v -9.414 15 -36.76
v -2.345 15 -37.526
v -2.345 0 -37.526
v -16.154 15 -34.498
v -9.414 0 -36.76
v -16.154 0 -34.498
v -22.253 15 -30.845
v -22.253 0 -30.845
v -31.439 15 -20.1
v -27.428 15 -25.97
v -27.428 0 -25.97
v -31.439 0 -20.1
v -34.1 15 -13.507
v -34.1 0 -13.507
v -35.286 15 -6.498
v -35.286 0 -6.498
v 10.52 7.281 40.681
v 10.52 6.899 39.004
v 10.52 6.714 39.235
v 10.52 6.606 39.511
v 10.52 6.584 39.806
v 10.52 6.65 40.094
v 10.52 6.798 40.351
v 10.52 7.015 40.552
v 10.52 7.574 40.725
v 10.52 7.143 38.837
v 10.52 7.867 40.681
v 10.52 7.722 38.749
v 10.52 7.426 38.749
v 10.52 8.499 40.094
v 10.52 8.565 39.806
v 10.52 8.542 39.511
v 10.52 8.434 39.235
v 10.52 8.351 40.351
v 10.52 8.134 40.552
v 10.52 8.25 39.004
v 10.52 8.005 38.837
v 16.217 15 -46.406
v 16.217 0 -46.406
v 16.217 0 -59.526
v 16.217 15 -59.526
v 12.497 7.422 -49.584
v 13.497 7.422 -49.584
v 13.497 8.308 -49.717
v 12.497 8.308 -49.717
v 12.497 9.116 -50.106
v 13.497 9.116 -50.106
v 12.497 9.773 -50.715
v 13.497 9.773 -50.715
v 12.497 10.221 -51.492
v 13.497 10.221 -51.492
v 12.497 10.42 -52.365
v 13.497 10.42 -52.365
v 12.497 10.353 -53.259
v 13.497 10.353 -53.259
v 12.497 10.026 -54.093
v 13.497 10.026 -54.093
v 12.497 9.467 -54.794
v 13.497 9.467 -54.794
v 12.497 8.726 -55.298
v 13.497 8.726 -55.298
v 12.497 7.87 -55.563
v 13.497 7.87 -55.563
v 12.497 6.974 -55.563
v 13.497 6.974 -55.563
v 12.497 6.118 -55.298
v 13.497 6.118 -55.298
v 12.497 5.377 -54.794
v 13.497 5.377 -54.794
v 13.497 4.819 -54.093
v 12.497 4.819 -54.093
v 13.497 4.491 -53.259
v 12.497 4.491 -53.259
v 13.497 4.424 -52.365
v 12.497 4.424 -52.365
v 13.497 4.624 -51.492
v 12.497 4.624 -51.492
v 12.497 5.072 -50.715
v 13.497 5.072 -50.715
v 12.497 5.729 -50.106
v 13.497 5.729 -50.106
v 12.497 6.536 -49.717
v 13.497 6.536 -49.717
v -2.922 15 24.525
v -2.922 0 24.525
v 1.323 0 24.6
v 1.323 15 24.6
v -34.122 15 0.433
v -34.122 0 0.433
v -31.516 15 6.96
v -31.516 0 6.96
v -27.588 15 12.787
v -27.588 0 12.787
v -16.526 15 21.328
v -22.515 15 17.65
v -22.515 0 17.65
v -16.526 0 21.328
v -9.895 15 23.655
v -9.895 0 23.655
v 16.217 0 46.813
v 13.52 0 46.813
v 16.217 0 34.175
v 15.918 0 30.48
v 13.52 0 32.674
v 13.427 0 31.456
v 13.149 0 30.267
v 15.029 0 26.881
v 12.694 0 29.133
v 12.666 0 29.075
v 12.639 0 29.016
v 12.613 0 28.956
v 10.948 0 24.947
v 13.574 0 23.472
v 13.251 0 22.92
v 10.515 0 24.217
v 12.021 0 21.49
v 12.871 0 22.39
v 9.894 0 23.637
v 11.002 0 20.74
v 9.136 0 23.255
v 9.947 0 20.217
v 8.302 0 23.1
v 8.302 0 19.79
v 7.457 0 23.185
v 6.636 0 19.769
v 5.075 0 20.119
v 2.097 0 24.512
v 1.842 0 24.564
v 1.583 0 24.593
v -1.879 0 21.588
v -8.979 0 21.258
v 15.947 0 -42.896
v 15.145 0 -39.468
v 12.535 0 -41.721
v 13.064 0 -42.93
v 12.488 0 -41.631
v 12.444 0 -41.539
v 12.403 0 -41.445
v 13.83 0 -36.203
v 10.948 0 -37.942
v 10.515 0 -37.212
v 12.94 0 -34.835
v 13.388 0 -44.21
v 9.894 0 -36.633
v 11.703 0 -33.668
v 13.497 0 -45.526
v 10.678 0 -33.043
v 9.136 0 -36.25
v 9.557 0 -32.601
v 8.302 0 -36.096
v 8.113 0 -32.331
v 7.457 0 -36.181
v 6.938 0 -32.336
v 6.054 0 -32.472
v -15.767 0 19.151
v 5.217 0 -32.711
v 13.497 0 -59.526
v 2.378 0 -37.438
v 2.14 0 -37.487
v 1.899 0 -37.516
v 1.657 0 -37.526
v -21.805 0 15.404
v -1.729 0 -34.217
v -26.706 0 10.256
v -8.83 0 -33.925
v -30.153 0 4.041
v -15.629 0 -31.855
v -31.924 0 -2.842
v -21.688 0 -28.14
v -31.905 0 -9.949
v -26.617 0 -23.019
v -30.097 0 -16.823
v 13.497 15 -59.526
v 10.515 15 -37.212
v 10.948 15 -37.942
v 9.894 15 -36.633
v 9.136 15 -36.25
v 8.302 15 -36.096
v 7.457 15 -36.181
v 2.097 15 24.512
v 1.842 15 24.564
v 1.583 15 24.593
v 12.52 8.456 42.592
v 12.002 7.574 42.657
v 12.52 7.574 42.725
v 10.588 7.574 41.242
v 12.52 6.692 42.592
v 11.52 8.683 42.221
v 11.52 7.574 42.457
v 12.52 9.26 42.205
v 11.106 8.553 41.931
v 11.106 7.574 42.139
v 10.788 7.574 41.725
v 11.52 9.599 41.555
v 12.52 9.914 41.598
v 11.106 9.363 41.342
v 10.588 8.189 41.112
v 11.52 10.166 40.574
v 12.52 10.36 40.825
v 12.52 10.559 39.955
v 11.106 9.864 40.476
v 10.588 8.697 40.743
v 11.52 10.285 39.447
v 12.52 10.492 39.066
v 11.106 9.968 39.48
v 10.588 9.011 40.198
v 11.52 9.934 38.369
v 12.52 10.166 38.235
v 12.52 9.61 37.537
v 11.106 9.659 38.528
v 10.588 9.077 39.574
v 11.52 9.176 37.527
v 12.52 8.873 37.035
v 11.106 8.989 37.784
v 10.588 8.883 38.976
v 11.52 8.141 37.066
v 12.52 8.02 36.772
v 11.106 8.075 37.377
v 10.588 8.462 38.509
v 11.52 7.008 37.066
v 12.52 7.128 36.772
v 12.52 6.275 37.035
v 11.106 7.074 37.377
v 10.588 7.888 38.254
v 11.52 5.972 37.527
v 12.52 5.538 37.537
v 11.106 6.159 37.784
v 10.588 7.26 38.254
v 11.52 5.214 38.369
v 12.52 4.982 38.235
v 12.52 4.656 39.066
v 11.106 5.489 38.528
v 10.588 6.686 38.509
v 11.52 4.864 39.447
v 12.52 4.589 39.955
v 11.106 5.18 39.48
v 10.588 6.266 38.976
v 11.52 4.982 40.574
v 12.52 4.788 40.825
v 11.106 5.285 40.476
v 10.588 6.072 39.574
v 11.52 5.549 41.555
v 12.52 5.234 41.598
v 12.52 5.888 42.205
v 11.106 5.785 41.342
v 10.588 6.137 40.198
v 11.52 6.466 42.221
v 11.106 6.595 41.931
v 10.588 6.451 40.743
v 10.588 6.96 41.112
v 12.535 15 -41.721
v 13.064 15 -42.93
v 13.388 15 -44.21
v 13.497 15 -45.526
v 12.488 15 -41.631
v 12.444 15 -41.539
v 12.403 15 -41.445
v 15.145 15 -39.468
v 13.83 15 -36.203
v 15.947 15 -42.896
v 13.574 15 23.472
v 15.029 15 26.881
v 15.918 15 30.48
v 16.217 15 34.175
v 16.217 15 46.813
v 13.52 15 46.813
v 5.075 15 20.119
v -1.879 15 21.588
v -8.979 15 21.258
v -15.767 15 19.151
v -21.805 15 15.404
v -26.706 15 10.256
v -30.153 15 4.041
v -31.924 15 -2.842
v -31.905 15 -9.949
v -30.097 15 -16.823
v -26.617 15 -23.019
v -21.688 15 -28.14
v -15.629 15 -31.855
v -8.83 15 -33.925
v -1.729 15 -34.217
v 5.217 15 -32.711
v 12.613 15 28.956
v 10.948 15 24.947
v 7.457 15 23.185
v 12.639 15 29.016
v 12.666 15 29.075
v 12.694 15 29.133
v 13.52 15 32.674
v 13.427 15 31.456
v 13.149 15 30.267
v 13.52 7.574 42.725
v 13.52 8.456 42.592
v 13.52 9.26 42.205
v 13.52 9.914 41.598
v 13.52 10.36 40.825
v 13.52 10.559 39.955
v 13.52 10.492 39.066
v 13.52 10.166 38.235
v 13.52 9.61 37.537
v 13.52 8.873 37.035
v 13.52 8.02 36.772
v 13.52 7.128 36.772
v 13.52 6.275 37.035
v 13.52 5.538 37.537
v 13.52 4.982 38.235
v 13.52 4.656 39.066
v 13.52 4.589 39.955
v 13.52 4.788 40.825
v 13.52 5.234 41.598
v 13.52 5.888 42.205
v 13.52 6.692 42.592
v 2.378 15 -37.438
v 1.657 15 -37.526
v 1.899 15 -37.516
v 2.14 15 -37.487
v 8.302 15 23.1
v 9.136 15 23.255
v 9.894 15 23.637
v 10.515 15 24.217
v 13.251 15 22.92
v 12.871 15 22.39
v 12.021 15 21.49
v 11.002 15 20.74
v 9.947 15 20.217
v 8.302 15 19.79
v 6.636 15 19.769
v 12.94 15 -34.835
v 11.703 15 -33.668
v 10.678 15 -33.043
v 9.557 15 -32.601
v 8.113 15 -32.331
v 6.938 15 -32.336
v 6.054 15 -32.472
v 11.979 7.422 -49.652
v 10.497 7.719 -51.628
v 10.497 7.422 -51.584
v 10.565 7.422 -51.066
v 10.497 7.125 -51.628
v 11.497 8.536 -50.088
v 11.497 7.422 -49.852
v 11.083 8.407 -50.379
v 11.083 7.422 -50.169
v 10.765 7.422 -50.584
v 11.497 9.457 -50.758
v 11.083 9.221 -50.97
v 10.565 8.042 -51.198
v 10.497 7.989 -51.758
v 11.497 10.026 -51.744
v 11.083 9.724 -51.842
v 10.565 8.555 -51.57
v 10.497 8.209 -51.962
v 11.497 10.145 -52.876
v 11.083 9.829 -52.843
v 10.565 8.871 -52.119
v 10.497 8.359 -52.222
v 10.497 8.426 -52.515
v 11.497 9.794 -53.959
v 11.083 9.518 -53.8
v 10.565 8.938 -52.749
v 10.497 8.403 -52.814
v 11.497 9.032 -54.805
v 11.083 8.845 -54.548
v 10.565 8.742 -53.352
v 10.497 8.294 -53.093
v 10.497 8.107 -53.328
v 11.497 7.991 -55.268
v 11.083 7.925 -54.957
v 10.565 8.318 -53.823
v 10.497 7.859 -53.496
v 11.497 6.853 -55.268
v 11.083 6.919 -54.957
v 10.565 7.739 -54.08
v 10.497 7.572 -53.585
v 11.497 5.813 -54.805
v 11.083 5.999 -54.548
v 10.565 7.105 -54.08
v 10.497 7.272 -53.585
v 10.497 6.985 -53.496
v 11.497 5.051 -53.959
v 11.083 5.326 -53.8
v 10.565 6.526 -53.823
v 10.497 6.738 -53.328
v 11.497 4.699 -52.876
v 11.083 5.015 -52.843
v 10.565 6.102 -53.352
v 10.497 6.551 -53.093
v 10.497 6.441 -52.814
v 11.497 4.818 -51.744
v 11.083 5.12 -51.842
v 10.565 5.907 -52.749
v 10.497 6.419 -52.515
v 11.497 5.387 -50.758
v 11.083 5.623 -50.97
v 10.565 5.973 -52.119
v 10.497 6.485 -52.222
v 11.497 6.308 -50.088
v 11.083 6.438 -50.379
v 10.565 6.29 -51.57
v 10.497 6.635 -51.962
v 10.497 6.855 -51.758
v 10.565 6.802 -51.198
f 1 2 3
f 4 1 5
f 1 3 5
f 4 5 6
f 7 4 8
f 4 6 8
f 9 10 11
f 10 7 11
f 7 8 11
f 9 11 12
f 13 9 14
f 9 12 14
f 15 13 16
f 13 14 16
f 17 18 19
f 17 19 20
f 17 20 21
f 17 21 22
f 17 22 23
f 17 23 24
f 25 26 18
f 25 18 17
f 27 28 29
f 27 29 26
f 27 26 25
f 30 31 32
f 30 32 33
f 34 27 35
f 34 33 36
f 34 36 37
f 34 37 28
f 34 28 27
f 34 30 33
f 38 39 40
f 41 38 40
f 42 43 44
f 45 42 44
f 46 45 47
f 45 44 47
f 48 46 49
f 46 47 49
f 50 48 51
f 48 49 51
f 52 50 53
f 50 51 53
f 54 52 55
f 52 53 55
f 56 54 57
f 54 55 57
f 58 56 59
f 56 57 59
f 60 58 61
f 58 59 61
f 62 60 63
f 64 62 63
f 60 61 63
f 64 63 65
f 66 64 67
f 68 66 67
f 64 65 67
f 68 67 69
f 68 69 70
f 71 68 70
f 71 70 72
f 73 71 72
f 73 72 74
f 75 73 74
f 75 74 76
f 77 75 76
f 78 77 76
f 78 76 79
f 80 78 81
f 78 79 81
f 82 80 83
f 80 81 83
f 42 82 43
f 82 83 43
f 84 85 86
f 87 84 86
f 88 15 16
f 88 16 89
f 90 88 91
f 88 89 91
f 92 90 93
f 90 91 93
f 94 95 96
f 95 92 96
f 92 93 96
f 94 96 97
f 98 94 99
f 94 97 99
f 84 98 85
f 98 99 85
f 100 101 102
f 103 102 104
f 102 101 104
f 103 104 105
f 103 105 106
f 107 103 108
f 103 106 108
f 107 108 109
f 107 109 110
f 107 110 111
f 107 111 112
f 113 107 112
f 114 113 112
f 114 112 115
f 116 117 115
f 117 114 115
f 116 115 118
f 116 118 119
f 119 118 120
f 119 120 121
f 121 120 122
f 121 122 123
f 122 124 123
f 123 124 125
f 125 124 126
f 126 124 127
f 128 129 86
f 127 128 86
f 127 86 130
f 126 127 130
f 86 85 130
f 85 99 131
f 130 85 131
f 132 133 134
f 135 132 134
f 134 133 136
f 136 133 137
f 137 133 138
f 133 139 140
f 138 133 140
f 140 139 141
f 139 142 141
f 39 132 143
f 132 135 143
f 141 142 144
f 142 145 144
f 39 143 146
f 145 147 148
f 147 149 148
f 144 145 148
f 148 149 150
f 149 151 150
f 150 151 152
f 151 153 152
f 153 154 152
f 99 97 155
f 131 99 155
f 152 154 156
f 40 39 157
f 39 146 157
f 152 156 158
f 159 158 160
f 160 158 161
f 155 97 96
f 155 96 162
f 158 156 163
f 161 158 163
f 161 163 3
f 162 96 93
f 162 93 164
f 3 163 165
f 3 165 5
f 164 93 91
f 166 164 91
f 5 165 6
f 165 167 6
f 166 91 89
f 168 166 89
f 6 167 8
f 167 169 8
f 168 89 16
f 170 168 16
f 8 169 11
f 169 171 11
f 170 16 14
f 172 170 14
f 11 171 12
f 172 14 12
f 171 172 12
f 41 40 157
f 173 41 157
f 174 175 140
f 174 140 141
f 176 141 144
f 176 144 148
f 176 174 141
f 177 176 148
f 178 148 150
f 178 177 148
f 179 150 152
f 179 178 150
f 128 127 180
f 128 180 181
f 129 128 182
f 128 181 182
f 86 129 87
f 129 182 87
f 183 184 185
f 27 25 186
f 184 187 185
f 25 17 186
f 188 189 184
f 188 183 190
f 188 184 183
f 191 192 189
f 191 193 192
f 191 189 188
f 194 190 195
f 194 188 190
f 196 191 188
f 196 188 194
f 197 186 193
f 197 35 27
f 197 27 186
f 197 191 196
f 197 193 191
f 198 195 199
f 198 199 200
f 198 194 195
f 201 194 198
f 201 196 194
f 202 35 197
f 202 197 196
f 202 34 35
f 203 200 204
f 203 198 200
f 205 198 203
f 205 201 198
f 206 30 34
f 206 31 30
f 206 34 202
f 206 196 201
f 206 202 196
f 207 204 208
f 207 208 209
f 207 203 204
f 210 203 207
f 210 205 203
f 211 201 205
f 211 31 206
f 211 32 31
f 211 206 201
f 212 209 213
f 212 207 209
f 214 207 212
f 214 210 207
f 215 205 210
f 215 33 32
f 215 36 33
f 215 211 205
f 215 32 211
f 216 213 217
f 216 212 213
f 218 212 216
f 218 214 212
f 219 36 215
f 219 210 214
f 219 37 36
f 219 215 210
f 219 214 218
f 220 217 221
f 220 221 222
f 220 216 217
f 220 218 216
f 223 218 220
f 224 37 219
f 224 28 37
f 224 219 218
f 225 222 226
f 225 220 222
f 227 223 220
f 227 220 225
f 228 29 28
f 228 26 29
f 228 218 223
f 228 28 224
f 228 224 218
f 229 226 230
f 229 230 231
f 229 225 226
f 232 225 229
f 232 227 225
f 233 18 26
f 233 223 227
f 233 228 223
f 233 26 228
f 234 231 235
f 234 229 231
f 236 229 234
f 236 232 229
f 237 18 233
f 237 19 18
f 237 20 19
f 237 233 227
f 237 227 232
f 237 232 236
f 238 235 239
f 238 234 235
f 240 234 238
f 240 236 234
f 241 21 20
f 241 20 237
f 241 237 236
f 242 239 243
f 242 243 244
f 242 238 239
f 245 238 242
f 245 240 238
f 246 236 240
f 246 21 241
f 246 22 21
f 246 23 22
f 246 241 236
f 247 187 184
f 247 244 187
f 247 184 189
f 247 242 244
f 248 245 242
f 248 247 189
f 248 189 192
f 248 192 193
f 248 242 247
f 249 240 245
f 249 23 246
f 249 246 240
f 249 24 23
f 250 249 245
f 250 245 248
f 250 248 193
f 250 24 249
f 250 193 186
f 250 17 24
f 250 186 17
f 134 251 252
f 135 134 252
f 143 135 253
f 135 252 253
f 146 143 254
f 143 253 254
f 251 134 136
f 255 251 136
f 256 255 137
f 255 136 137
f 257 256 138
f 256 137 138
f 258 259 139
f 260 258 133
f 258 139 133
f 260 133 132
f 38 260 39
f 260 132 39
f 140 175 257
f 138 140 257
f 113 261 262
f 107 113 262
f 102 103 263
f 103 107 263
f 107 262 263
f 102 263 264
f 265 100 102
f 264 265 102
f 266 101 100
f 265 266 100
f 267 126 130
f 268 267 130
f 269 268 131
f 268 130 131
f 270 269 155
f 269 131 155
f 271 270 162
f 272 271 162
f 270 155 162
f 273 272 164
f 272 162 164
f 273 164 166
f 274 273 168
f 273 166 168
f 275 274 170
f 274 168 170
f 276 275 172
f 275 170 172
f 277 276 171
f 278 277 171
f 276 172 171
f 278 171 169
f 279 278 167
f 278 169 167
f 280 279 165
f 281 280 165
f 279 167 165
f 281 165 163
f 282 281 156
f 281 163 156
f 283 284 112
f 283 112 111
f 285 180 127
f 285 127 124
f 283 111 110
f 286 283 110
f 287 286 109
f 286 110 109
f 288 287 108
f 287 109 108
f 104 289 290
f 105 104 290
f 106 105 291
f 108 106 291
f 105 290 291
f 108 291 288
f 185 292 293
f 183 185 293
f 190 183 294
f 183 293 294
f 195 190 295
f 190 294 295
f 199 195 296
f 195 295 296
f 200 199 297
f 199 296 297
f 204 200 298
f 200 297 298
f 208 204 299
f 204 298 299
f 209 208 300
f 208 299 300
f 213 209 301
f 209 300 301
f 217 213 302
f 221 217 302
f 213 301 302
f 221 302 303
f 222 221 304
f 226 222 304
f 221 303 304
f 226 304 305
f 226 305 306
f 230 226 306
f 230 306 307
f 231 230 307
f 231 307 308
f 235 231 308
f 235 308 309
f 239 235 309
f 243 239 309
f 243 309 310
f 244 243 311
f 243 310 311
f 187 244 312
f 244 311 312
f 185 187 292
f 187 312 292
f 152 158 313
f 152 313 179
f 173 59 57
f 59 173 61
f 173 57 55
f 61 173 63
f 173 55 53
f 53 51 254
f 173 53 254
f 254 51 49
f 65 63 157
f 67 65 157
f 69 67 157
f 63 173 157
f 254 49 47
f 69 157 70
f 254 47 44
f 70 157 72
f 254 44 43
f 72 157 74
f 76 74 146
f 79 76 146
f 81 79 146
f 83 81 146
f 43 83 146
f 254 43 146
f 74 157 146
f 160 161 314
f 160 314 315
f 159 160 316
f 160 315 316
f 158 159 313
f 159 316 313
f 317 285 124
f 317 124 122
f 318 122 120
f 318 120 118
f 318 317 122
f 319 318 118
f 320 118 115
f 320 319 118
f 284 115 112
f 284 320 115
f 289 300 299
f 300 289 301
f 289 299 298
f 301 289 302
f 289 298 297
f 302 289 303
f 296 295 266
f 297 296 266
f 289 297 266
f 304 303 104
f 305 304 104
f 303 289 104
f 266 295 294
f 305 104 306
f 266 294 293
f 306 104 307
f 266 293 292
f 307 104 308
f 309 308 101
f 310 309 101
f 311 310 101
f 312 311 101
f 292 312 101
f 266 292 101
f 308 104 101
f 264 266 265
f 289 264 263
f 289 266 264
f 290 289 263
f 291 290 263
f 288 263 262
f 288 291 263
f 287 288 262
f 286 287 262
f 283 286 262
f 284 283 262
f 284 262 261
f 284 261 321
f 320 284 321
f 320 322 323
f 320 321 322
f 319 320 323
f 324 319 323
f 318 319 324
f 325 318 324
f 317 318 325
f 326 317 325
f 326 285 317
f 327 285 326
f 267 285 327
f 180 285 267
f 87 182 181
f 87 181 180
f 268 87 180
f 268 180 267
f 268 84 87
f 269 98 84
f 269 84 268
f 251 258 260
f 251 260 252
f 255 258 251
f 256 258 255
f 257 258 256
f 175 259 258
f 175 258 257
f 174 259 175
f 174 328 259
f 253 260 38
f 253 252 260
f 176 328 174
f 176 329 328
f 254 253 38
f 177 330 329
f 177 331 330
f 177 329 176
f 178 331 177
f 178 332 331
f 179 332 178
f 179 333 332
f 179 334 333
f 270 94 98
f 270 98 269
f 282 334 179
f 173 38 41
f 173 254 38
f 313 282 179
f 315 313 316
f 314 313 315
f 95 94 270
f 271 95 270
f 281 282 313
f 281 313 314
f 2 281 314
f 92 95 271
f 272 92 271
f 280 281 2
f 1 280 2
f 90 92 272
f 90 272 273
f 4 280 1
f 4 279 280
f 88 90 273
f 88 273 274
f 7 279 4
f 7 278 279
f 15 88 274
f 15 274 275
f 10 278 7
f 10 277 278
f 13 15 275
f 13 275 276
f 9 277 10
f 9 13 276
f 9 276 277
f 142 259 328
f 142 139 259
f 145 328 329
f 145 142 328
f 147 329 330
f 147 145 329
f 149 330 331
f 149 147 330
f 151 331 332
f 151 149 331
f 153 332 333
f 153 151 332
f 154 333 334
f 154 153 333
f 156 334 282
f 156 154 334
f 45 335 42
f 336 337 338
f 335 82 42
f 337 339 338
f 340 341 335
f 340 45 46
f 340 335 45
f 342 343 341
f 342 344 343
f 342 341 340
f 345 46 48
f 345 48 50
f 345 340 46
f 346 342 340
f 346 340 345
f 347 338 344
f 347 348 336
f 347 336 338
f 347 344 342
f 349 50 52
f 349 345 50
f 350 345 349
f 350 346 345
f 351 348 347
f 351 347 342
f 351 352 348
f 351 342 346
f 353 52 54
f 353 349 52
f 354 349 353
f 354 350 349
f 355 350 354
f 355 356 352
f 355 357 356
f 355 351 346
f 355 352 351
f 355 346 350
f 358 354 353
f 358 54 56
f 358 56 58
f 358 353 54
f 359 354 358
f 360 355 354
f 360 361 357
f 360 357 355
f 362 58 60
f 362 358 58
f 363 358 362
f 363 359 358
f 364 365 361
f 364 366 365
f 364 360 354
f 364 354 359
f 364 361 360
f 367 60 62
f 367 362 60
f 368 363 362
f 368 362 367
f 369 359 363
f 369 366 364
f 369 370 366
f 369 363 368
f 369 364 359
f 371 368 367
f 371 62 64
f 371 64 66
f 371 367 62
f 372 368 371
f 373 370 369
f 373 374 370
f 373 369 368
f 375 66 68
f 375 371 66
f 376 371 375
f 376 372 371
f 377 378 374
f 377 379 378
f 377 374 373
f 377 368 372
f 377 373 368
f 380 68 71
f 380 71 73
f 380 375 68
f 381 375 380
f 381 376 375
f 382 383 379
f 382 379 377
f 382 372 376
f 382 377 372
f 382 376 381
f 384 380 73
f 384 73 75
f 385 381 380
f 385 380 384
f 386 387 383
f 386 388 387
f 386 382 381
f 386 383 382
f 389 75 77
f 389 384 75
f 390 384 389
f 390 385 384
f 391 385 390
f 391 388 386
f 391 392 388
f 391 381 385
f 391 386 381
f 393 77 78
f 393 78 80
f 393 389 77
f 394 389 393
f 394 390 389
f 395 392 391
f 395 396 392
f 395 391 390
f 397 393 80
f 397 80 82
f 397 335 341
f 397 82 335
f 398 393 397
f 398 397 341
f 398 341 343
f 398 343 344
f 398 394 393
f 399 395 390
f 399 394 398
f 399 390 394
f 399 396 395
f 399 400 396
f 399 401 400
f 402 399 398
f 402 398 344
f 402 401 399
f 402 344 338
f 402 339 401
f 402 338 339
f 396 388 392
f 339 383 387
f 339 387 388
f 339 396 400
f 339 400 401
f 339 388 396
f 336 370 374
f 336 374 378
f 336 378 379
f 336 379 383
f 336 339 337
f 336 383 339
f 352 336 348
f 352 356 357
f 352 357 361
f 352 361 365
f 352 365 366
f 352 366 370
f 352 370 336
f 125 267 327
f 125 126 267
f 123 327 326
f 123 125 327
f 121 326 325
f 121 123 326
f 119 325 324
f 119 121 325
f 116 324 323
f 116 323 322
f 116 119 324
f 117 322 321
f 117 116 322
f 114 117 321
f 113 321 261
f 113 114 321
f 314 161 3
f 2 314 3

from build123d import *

# Parameters (mm, degrees)
BOSS_EXTRUDE1_DEPTH = 15
FILLET1_R           = 33
FILLET3_R           = 8
SKETCH3_W           = 14.976754218
SKETCH3_H           = 50.502927364
CUT_EXTRUDE1_DEPTH  = 71.805882398
FILLET4_R           = 13
FILLET5_R           = 23
CUT_EXTRUDE2_DEPTH  = 71.805882398
FILLET6_R           = 3
FILLET7_R           = 7
SKETCH11_R          = 2.99322587
BOSS_EXTRUDE3_DEPTH = 3
SKETCH12_R          = 3.00628595
BOSS_EXTRUDE4_DEPTH = 3
FILLET15_R          = 2


with BuildPart() as part:
    # Sketch1 → Boss-Extrude1 (new body)
    with BuildSketch(Plane(origin=(0, 0, 0), x_dir=(1, 0, 0), z_dir=(0, 1, 0))):
        with BuildLine():
            Line((13.49710544, 37.52594122), (-35.345435735, 37.52594122))
            Line((-35.345435735, 37.52594122), (-35.345435735, -23.95909877))
            Line((-35.345435735, -23.95909877), (13.519906977, -24.812641875))
            Line((13.519906977, -24.812641875), (13.519906977, -46.812641875))
            Line((13.519906977, -46.812641875), (16.216594819, -46.812641875))
            Line((16.216594819, -46.812641875), (16.216594819, -12.903441484))
            ThreePointArc((16.216594819, -12.903441484), (-32.140827884, 6.320900922), (16.216594819, 25.545243327))
            Line((16.216594819, 25.545243327), (16.216594819, 59.52594122))
            Line((16.216594819, 59.52594122), (13.49710544, 59.52594122))
            Line((13.49710544, 59.52594122), (13.49710544, 37.52594122))
        make_face()
    extrude(amount=BOSS_EXTRUDE1_DEPTH)

    # Fillet1
    # the kernel refuses this fillet: 33 mm, written as the material it takes off along each edge
    with BuildSketch(Plane(origin=(-35.345435735, -81.071536578, 23.95909877), x_dir=(0, 0, -1), z_dir=(0, 1, 0))) as fillet1_piece_1:
        with BuildLine():
            CenterArc((FILLET1_R * 0.98268529185, -FILLET1_R), FILLET1_R, 90, 88.999302122)
            Line((-FILLET1_R * 0.0171621906577, -FILLET1_R * 0.982535415153), (0, 0))
            Line((0, 0), (FILLET1_R * 0.98268529185, 0))
        make_face()
    extrude(amount=177.143073155, mode=Mode.SUBTRACT)
    with BuildSketch(Plane(origin=(-35.345435735, -82.5, -37.52594122), x_dir=(1, 0, 0), z_dir=(0, 1, 0))) as fillet1_piece_2:
        with BuildLine():
            CenterArc((FILLET1_R, -FILLET1_R), FILLET1_R, 90, 90)
            Line((0, -FILLET1_R), (0, 0))
            Line((0, 0), (FILLET1_R, 0))
        make_face()
    extrude(amount=180, mode=Mode.SUBTRACT)

    # Fillet3
    fillet3_edges = [part.edges().sort_by_distance(p)[0] for p in [
        (13.519906977, 7.5, 24.812641875),
        (13.49710544, 7.5, -37.52594122),
    ]]
    fillet(fillet3_edges, radius=FILLET3_R)

    # Sketch3 → Cut-Extrude1 (cut, through all)
    with BuildSketch(Plane(origin=(0, 15, 0), x_dir=(1, 0, 0), z_dir=(0, 1, 0))):
        with Locations((13.189850954, 6.26949409)):
            Rectangle(SKETCH3_W, SKETCH3_H)
    extrude(amount=-CUT_EXTRUDE1_DEPTH, mode=Mode.SUBTRACT)

    # Fillet4
    fillet4_edges = [part.edges().sort_by_distance(p)[0] for p in [
        (8.063971776, 7.5, -31.520957772),
        (7.849365767, 7.5, 18.981969592),
    ]]
    fillet(fillet4_edges, radius=FILLET4_R)

    # Fillet5
    # the kernel refuses this fillet: 23 mm, written as the material it takes off along each edge
    with BuildSketch(Plane(origin=(16.216594819, -37.21201477, -31.520957772), x_dir=(-1, 0, 0), z_dir=(0, 1, 0))) as fillet5_piece_1:
        with BuildLine():
            CenterArc((23, -14.884805908), FILLET5_R, 139.671769874, 40.328230126)
            Line((0, -14.884805908), (-0.46, -14.884805908))
            Line((-0.46, -14.884805908), (-0.46, 0))
            Line((-0.46, 0), (0, 0.46))
            ThreePointArc((0, 0.46), (2.73298008, 0.46), (5.115279364, 0.297696118))
            Line((5.115279364, 0.297696118), (5.465960161, 0))
        make_face()
    extrude(amount=89.424029541, mode=Mode.SUBTRACT)
    with BuildSketch(Plane(origin=(16.216594819, 52.982840025, 18.981969592), x_dir=(-1, 0, 0), z_dir=(0, -1, 0))) as fillet5_piece_2:
        with BuildLine():
            CenterArc((23, -15.19313601), FILLET5_R, 138.656554967, 41.343445033)
            Line((0, -15.19313601), (-0.46, -15.19313601))
            Line((-0.46, -15.19313601), (-0.46, 0))
            Line((-0.46, 0), (0, 0.46))
            ThreePointArc((0, 0.46), (2.866220147, 0.46), (5.3870891, 0.30386272))
            Line((5.3870891, 0.30386272), (5.732440294, 0))
        make_face()
    extrude(amount=90.96568005, mode=Mode.SUBTRACT)

    # Sketch4 → Cut-Extrude2 (cut, through all)
    with BuildSketch(Plane(origin=(0, 15, 0), x_dir=(1, 0, 0), z_dir=(0, 1, 0))):
        Polygon((1.715705502, -24.606454949), (9.959521951, -22.566105124), (13.119950571, -30.176257645), align=None)
        Polygon((13.119950571, 43.171714726), (1.715705502, 37.60191203), (9.959521951, 35.561562205), align=None)
    extrude(amount=-CUT_EXTRUDE2_DEPTH, mode=Mode.SUBTRACT)

    # Fillet6
    # the kernel refuses this fillet: 3 mm, written as the material it adds along each edge
    with BuildSketch(Plane(origin=(9.959521951, 15, 22.566105124), x_dir=(0.38353267260391577, 0, 0.9235273082293222), z_dir=(0, -1, 0)), Plane(origin=(9.959521951, 15, -35.561562205), x_dir=(-0.9707106735613967, 0, -0.24025151036773845), z_dir=(0, -1, 0))) as fillet6_piece_1:
        with BuildLine():
            CenterArc((FILLET6_R * 0.859357235827, FILLET6_R), FILLET6_R, 188.651291771, 81.348708229)
            Line((-FILLET6_R * 0.129264883466, FILLET6_R * 0.849579571712), (0, 0))
            Line((0, 0), (FILLET6_R * 0.859357235827, 0))
        make_face()
    extrude(amount=15)
    # the kernel refuses this fillet: 3 mm, written as the material it takes off along each edge
    with BuildSketch(Plane(origin=(12.653561764, -0.262717319, 29.053216951), x_dir=(-0.3835326726039229, 0, -0.9235273082293193), z_dir=(0, 1, 0))) as fillet6_2_piece_1:
        with BuildLine():
            CenterArc((0.105086928, -3), FILLET6_R, 90, 3.716956431)
            ThreePointArc((-0.089395975, -0.00631057), (-0.044689151, -0.003280466), (0, 0))
            Line((0, 0), (0.105086928, 0))
        make_face()
    extrude(amount=15.525434639, mode=Mode.SUBTRACT)
    with BuildSketch(Plane(origin=(12.466360821, -0.41333627, -41.597903613), x_dir=(0.4833086879383824, 0, -0.8754500055190354), z_dir=(0, 1, 0))) as fillet6_2_piece_2:
        with BuildLine():
            CenterArc((0.167434819, -2.999883511), FILLET6_R, 90.504917507, 5.844127099)
            Line((-0.164320455, -0.018283532), (0, 0))
            ThreePointArc((0, 0), (0.070498871, -0.000310637), (0.140997742, 0))
        make_face()
    extrude(amount=15.826672539, mode=Mode.SUBTRACT)
    with BuildSketch(Plane(origin=(1.715705502, 15.980874738, 24.606454949), x_dir=(-0.9998474825072629, 0, -0.017464584847299507), z_dir=(0, -1, 0))) as fillet6_2_piece_3:
        with BuildLine():
            CenterArc((FILLET6_R * 0.130783298337, FILLET6_R), FILLET6_R, 255.097916944, 14.902083056)
            Line((-FILLET6_R * 0.126384628394, FILLET6_R * 0.0336332696842), (0, 0))
            Line((0, 0), (FILLET6_R * 0.130783298337, 0))
        make_face()
    extrude(amount=16.961749475, mode=Mode.SUBTRACT)
    with BuildSketch(Plane(origin=(2.022657479, 15.914333267, -37.52594122), x_dir=(0.9707106735613966, 0, 0.24025151036773865), z_dir=(0, -1, 0))) as fillet6_2_piece_4:
        with BuildLine():
            CenterArc((FILLET6_R * 0.121911102219, FILLET6_R), FILLET6_R, 256.098614822, 13.901385178)
            Line((-FILLET6_R * 0.118340408149, FILLET6_R * 0.0292893264386), (0, 0))
            Line((0, 0), (FILLET6_R * 0.121911102219, 0))
        make_face()
    extrude(amount=16.828666533, mode=Mode.SUBTRACT)

    # Fillet7
    fillet7_edges = [part.edges().sort_by_distance(p)[0] for p in [
        (10.484154524, 7.5, 18.981969592),
        (10.750634658, 7.5, -31.520957772),
    ]]
    fillet(fillet7_edges, radius=FILLET7_R)

    # Sketch11 → Boss-Extrude3 (add)
    with BuildSketch(Plane.ZY.offset(-13.519906977)):
        with Locations((39.731607941, 7.574163162)):
            Circle(SKETCH11_R)
    extrude(amount=BOSS_EXTRUDE3_DEPTH)

    # Sketch12 → Boss-Extrude4 (add)
    with BuildSketch(Plane.ZY.offset(-13.49710544)):
        with Locations((-52.589854429, 7.422107304)):
            Circle(SKETCH12_R)
    extrude(amount=BOSS_EXTRUDE4_DEPTH)

    # Fillet15
    fillet15_edges = [part.edges().sort_by_distance(p)[0] for p in [
        (10.519906977, 7.574163162, 36.738382071),
        (10.49710544, 7.422107304, -55.59614038),
    ]]
    fillet(fillet15_edges, radius=FILLET15_R)


solid = part.part
